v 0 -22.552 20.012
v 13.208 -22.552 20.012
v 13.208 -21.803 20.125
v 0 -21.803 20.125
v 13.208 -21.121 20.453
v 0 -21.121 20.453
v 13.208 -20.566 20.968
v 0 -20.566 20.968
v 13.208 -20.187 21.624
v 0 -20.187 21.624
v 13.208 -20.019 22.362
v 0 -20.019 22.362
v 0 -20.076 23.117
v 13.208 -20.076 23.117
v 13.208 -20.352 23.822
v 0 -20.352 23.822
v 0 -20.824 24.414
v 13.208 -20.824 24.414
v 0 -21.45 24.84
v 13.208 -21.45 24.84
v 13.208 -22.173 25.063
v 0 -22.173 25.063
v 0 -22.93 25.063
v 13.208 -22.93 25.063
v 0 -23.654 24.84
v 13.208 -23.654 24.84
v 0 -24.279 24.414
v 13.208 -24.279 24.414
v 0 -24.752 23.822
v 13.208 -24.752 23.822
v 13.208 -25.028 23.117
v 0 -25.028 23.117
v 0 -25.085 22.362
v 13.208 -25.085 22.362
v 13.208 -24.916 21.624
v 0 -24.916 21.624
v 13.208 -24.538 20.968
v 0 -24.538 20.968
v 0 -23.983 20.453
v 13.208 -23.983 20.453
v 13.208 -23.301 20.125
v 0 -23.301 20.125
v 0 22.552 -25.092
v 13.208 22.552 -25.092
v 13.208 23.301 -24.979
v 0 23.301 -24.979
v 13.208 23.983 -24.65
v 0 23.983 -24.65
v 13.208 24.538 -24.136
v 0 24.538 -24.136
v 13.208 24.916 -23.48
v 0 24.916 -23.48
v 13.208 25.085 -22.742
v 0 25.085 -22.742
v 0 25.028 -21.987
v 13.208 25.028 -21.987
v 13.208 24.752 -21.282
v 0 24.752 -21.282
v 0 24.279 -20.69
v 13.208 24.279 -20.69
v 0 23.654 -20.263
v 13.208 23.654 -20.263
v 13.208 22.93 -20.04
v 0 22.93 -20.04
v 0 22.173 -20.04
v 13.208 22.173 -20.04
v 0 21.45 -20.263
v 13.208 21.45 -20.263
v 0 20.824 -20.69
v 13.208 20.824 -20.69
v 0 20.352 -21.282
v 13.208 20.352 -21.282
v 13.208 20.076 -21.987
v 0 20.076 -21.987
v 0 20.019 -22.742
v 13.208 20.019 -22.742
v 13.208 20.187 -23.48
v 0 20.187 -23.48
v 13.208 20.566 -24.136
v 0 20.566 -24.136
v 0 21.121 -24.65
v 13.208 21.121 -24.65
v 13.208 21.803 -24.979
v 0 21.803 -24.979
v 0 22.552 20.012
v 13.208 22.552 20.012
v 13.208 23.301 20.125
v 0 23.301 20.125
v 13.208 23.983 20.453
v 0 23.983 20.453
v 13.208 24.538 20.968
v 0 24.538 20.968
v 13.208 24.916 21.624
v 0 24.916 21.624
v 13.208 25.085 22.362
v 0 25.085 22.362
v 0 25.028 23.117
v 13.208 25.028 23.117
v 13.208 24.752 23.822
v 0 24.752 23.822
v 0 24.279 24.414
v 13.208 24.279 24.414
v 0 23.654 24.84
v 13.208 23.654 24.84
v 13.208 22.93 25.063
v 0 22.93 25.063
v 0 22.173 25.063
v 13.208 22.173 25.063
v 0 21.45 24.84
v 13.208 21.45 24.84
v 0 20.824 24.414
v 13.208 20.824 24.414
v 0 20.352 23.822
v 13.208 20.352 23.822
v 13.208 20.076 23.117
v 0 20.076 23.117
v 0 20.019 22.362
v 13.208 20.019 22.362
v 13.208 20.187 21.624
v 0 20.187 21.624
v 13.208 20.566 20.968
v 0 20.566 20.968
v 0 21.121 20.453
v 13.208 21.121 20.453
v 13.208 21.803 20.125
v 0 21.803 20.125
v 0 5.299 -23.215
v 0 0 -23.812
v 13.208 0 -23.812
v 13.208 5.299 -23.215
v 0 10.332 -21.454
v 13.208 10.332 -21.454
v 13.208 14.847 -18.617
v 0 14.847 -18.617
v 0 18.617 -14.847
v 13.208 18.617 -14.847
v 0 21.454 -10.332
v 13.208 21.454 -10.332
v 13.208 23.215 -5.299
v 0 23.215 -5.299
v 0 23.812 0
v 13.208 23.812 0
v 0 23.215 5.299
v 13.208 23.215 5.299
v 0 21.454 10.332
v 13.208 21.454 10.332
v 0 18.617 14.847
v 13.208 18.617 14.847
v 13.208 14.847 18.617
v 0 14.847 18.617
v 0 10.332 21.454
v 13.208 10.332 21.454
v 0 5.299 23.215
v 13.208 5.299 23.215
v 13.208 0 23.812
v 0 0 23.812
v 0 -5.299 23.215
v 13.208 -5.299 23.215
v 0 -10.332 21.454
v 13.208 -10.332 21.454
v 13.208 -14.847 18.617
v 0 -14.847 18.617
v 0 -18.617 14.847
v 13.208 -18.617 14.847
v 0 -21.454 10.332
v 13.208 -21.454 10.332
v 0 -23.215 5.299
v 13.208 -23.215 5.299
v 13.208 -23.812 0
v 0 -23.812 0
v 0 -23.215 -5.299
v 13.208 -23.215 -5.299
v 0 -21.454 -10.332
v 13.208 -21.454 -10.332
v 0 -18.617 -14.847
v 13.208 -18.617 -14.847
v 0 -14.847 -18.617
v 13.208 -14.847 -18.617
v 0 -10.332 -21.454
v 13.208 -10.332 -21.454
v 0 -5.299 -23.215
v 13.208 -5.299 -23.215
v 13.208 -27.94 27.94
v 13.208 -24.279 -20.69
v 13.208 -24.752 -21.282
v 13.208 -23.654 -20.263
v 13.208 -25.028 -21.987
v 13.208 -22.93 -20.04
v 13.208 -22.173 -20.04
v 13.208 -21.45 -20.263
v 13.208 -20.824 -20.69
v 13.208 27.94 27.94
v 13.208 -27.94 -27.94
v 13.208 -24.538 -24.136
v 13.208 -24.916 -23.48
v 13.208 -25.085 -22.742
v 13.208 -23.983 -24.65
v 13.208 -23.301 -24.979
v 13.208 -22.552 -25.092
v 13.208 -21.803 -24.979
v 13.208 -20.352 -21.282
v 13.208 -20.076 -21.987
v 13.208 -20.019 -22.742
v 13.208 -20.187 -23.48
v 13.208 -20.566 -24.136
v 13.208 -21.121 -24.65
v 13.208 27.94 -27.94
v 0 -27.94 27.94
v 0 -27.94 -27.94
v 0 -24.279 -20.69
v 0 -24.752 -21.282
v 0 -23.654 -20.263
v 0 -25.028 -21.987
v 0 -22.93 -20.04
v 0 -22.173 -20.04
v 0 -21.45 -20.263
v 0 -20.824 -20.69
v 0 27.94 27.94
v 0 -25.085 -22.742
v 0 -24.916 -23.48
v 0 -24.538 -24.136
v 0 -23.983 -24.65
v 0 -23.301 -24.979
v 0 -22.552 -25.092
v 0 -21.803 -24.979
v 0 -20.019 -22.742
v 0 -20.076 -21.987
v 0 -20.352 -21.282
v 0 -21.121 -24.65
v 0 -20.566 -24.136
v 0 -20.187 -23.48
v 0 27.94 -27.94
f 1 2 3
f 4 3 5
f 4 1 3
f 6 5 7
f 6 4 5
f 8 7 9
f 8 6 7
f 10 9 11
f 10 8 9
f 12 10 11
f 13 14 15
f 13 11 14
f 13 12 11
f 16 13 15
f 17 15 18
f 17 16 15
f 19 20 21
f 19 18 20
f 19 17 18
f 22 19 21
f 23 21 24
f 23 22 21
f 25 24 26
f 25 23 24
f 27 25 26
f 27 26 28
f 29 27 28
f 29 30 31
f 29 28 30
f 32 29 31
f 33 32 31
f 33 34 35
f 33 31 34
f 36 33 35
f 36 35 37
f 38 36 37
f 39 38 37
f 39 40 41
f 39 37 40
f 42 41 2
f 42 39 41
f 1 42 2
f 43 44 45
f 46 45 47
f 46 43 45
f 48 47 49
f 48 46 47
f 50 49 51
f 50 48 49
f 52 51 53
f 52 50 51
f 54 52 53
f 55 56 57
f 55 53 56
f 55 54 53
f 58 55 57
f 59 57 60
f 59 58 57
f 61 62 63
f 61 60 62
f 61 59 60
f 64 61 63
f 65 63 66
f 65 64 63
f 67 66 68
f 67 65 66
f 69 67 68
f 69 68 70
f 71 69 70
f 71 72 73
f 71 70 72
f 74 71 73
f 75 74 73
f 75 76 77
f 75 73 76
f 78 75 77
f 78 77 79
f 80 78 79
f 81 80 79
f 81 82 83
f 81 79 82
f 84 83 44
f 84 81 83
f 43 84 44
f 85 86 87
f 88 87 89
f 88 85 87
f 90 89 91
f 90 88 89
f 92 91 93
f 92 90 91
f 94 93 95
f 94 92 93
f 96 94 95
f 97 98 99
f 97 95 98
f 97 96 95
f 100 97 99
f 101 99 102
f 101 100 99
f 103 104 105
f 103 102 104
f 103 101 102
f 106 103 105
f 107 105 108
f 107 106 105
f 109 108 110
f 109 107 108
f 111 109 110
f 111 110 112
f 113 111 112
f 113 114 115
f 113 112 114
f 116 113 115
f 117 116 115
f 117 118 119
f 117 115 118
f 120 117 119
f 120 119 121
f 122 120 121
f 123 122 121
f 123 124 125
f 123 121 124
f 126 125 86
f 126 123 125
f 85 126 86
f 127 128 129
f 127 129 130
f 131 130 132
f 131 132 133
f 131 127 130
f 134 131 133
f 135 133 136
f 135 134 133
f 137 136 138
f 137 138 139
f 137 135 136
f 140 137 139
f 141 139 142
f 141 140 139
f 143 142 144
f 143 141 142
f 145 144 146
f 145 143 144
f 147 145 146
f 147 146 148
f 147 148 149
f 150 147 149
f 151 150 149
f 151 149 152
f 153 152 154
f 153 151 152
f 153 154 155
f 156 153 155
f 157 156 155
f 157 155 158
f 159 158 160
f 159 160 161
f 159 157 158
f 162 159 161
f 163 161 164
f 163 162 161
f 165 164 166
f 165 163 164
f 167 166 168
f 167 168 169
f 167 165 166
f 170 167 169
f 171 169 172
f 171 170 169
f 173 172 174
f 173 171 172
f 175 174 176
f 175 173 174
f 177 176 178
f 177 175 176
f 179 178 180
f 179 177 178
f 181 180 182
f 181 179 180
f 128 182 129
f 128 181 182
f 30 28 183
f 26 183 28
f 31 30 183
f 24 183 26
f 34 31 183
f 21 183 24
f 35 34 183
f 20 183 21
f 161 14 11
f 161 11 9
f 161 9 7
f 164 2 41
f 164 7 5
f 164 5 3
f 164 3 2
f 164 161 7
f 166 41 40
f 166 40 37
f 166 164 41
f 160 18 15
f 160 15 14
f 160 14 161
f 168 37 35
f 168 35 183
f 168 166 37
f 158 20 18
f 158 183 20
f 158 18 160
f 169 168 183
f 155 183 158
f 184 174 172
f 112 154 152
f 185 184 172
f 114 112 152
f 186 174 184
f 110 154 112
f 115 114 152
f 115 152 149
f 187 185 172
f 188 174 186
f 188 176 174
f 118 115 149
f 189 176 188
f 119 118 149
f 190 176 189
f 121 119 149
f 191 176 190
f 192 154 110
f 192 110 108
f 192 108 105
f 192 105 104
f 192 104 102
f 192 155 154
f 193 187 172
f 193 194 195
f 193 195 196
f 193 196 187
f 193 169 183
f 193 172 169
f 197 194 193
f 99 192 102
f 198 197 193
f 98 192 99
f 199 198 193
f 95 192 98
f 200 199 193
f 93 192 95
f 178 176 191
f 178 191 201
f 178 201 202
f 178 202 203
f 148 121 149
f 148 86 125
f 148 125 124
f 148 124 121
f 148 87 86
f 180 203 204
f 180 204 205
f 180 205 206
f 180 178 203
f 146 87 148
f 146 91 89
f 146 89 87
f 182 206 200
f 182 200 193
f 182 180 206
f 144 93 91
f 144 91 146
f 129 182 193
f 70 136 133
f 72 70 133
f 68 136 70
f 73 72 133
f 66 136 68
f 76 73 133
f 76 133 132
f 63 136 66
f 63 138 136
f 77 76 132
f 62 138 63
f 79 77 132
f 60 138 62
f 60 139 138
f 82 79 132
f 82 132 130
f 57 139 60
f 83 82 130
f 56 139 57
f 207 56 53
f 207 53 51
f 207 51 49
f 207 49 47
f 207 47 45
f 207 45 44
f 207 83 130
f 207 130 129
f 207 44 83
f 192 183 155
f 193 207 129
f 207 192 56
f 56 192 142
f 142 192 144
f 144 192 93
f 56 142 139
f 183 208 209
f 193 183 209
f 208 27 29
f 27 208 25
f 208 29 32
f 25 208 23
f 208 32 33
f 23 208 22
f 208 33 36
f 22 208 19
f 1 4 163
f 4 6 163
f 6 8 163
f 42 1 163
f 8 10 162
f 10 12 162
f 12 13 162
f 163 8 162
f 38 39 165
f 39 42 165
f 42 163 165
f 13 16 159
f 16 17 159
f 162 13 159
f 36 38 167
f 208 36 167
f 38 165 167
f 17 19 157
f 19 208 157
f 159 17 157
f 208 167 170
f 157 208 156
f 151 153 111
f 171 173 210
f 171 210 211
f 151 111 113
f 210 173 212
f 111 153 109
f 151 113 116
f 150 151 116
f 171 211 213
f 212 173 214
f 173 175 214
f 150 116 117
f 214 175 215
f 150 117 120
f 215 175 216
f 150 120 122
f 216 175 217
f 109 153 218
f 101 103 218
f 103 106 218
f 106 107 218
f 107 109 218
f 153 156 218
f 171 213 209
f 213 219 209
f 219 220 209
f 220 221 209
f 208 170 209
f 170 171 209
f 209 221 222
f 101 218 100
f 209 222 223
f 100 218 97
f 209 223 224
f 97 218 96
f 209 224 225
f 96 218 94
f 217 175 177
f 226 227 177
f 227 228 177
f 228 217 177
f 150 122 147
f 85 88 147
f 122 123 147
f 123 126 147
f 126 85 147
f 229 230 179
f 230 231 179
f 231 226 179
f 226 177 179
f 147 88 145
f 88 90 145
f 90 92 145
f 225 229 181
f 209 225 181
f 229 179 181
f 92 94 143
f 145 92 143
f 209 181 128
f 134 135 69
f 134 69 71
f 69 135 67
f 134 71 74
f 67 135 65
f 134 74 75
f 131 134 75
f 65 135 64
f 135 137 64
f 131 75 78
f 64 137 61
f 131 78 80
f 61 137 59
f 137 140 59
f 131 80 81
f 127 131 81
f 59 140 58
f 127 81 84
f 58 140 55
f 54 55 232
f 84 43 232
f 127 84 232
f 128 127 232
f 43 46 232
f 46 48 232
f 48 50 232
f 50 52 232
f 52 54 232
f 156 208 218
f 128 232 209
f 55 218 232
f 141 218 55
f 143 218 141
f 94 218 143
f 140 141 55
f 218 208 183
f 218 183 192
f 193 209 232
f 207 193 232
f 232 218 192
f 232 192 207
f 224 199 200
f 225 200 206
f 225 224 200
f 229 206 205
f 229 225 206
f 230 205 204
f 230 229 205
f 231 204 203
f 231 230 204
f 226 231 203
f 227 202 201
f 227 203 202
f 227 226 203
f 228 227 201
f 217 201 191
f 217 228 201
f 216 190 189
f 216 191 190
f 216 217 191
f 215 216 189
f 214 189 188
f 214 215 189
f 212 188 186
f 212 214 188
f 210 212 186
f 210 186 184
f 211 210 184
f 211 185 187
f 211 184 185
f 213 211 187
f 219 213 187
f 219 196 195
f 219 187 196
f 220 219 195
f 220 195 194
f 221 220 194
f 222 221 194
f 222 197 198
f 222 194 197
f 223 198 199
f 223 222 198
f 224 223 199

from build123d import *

# Parameters (mm, degrees)
SKETCH1_W               = 55.88
SKETCH1_H               = 55.88
SKETCH1_R               = 23.8125
BOSS_EXTRUDE1_DEPTH     = 13.208
SKETCH5_R               = 2.54
CUT_EXTRUDE2_DEPTH      = 14.208
CUT_EXTRUDE2_DEPTH_BACK = 1


with BuildPart() as part:
    # Sketch1 → Boss-Extrude1 (new body)
    with BuildSketch(Plane(origin=(0, 0, 0), x_dir=(0, 0, -1), z_dir=(1, 0, 0))):
        Rectangle(SKETCH1_W, SKETCH1_H)
        Circle(SKETCH1_R, mode=Mode.SUBTRACT)
    extrude(amount=BOSS_EXTRUDE1_DEPTH)

    # Sketch5 → Cut-Extrude2 (cut, two sides)
    with BuildSketch(Plane(origin=(0, 0, 0), x_dir=(0, 0, -1), z_dir=(1, 0, 0))) as cut_extrude2_sk:
        with Locations((-22.551846327, -22.551846327)):
            Circle(SKETCH5_R)
        with Locations((-22.551846327, 22.551846327)):
            Circle(SKETCH5_R)
        with Locations((22.551846327, 22.551846327)):
            Circle(SKETCH5_R)
        with Locations((22.551846327, -22.551846327)):
            Circle(SKETCH5_R)
    extrude(amount=CUT_EXTRUDE2_DEPTH, mode=Mode.SUBTRACT)
    extrude(cut_extrude2_sk.sketch, amount=-CUT_EXTRUDE2_DEPTH_BACK, mode=Mode.SUBTRACT)


solid = part.part
